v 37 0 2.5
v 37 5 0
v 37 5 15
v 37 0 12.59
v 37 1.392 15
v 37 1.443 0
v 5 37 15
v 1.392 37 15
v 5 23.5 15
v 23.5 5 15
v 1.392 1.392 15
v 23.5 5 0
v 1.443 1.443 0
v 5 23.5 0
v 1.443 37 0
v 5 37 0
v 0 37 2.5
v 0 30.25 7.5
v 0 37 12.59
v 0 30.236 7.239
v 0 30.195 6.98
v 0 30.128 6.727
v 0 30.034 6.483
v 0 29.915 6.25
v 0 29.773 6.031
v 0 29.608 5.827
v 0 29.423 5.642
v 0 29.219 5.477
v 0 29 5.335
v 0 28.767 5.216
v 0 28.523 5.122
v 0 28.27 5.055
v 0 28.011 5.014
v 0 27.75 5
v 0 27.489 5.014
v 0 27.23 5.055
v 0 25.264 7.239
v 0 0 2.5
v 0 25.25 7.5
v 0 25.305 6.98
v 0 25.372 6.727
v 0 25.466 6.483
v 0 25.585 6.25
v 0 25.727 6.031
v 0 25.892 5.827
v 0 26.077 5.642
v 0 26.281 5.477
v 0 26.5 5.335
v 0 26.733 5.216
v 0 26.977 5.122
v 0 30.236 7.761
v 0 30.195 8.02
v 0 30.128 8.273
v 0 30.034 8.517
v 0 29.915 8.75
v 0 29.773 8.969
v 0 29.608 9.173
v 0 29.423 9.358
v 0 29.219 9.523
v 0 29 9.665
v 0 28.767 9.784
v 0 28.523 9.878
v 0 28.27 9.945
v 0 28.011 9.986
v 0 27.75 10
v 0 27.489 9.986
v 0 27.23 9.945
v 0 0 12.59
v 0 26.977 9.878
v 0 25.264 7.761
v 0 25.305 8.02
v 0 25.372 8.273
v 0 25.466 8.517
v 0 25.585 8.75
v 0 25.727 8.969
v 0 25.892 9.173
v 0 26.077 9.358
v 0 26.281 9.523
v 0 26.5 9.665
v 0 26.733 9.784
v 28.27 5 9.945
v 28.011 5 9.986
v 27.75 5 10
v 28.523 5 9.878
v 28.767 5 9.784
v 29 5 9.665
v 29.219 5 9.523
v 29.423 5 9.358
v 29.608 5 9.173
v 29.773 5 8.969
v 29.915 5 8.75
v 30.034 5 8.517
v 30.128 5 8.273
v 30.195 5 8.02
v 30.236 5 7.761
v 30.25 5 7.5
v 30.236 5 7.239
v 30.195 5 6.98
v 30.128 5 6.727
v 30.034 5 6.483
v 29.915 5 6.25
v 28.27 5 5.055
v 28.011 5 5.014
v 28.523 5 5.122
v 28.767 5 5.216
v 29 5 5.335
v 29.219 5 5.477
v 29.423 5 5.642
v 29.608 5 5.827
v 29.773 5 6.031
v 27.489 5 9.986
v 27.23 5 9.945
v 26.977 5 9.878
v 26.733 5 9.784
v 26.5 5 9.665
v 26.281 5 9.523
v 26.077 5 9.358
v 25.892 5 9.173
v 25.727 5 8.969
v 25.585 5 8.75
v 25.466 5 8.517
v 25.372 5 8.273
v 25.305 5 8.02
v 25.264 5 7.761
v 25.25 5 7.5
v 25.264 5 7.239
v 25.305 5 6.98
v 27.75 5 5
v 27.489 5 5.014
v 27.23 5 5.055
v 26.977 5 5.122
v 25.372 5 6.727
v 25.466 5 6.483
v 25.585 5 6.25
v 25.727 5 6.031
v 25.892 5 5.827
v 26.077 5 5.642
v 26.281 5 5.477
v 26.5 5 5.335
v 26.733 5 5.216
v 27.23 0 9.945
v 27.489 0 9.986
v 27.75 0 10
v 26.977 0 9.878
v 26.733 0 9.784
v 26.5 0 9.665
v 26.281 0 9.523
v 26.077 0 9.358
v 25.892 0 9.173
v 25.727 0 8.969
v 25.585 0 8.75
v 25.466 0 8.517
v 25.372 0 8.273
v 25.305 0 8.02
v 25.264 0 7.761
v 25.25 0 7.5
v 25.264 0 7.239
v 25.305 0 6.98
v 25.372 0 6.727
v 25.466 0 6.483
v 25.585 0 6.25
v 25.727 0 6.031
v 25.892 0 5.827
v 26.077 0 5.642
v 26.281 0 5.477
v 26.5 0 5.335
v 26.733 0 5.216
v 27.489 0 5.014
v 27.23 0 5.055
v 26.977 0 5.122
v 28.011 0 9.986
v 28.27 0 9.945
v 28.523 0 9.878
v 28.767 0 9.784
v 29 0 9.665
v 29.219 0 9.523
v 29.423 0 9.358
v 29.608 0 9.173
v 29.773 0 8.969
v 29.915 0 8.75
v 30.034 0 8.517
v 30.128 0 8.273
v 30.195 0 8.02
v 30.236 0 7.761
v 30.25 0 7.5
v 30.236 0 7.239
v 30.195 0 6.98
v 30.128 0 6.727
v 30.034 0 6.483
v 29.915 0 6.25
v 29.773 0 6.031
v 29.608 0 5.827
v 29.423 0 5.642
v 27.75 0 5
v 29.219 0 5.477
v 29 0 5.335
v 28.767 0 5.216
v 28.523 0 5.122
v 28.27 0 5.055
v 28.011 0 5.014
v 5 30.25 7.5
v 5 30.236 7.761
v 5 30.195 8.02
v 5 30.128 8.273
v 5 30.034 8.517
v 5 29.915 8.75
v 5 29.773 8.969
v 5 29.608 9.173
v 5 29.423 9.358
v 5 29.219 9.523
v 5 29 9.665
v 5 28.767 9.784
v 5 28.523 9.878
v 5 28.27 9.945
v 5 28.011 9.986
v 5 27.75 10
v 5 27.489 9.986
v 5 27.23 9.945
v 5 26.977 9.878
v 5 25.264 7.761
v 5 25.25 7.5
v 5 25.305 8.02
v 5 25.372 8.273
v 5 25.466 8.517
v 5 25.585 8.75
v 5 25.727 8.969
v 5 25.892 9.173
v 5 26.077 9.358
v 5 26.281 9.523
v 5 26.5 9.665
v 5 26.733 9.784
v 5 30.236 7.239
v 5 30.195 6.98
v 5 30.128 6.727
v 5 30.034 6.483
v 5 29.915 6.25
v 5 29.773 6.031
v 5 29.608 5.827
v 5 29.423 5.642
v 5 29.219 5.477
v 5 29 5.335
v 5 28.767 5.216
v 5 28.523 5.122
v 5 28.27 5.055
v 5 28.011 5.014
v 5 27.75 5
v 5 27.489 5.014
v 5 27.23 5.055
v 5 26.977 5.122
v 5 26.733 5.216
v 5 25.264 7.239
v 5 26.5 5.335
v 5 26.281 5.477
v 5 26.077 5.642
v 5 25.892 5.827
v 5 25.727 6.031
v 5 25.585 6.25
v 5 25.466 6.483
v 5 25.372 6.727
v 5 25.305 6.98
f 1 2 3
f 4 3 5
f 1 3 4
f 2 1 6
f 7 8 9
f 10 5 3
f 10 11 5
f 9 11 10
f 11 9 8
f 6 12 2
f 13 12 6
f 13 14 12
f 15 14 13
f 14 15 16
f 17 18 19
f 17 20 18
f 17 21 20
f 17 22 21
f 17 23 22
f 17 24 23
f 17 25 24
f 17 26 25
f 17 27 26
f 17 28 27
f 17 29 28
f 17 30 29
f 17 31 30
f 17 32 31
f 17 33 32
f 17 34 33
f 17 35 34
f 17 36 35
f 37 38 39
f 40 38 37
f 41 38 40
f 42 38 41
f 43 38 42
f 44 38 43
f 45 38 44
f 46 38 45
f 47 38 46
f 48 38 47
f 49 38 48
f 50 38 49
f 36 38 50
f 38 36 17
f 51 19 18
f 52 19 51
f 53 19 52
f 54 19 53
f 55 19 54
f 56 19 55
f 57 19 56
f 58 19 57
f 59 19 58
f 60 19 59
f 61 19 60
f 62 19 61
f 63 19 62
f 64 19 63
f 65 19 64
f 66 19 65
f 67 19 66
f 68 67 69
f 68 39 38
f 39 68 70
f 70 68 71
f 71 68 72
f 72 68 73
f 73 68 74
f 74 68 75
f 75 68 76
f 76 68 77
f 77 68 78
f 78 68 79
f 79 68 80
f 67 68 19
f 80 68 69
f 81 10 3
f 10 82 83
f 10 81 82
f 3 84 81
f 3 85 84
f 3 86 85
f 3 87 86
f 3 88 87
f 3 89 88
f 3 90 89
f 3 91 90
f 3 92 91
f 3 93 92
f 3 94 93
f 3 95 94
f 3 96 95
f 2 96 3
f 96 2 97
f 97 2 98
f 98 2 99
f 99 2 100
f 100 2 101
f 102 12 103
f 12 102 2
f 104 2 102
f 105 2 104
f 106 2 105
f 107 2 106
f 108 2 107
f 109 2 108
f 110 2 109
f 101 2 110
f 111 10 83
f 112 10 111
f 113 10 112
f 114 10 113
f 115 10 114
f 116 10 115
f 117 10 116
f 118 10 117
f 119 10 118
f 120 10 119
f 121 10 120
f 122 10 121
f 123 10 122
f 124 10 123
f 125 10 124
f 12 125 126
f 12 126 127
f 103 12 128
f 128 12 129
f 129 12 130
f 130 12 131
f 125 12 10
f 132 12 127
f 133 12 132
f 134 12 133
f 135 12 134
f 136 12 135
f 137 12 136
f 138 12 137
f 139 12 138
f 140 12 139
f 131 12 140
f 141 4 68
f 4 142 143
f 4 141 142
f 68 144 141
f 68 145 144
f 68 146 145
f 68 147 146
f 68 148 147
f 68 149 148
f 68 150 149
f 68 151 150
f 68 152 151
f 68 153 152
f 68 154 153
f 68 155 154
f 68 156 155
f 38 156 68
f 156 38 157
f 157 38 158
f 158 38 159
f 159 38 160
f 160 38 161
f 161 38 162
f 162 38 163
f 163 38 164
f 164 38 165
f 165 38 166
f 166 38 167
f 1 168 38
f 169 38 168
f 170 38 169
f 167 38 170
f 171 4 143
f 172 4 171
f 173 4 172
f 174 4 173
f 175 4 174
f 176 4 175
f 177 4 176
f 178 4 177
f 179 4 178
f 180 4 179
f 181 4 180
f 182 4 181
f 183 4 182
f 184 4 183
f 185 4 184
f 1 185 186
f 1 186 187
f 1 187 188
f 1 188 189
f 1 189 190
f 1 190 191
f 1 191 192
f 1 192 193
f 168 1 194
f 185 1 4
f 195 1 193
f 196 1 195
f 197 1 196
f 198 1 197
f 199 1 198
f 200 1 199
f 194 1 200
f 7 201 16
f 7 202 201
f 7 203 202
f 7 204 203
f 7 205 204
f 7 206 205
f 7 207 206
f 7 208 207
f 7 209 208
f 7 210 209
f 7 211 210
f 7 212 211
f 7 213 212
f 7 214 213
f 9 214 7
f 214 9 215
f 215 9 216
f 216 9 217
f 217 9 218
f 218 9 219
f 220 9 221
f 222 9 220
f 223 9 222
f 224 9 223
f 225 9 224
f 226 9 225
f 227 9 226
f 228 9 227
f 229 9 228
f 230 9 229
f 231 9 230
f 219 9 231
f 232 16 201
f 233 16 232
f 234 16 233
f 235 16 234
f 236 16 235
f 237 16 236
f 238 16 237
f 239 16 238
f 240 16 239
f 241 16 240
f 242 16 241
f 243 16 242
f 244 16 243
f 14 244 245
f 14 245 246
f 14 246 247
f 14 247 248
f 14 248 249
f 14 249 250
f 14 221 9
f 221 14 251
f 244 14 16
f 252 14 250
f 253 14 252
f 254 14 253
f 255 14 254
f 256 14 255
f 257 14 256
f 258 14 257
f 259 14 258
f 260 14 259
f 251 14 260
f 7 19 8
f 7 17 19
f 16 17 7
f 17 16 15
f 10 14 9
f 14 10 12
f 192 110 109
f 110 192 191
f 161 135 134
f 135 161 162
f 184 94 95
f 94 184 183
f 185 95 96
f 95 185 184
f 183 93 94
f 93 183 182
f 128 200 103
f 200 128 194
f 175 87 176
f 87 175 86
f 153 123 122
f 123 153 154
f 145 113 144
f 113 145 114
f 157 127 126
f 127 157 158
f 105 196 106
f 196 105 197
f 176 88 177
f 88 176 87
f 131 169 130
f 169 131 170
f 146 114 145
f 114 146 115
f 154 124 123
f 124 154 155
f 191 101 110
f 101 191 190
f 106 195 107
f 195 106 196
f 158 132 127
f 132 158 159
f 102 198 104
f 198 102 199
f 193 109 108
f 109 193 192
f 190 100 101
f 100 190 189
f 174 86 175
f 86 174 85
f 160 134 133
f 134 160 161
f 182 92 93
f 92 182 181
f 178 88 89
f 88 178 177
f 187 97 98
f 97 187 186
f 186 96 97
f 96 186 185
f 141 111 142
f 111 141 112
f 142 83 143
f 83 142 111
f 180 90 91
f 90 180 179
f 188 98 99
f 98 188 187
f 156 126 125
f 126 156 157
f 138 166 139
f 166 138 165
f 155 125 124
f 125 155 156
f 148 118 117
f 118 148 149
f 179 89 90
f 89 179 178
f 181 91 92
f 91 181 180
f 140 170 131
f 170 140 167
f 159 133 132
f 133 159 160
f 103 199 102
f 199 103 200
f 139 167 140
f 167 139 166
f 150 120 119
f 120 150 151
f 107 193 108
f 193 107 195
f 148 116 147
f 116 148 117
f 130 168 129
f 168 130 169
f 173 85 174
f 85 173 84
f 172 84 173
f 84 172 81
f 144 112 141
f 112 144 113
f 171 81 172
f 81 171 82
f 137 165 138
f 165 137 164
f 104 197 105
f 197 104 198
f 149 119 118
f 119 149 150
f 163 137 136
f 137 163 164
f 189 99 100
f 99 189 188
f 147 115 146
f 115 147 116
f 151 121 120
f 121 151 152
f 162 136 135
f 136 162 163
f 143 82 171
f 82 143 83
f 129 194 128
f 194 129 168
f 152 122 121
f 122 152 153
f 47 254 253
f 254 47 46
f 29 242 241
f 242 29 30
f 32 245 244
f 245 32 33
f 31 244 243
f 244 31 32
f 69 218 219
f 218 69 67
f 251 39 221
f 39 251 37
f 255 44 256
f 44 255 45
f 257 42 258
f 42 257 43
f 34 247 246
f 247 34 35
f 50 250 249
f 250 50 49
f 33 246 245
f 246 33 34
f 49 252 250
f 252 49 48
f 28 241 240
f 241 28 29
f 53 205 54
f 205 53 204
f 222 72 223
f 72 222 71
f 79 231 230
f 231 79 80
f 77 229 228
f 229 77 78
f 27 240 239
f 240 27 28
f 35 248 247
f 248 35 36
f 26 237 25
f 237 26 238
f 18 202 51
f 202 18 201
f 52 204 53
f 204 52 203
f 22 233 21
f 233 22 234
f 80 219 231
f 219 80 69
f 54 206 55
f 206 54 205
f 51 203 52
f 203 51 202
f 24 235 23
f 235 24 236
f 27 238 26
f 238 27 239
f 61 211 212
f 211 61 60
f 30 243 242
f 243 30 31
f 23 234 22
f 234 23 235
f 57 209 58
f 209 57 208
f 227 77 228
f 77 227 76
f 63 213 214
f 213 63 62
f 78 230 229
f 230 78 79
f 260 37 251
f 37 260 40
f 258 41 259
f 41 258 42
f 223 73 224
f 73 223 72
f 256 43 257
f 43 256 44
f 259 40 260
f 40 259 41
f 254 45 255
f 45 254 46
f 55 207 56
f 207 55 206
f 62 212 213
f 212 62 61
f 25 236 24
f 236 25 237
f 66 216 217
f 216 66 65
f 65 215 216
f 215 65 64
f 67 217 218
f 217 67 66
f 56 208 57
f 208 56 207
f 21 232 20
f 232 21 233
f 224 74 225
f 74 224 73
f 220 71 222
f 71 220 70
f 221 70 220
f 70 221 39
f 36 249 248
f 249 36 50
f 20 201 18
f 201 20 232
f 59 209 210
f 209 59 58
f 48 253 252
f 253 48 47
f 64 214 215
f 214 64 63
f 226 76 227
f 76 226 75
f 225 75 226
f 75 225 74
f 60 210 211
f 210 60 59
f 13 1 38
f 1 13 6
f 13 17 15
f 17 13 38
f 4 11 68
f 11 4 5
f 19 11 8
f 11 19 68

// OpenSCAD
timber_construct_w = 37;
timber_construct_h = 63;
base_sheet_t = 18;
d_hole = 5;


hyp = sqrt(((timber_construct_w/2)*(timber_construct_w/2))+((timber_construct_w/2)*(timber_construct_w/2)));
$fn=60;

module prism(l, w, h)
{
    polyhedron(
        points=[[0,0,0], [l,0,0], [l,w,0], [0,w,0], [0,w,h], [l,w,h]],
        faces=[[0,1,2,3],[5,4,3,2],[0,4,5,1],[0,3,4],[5,2,1]]
        );
}


difference()
{
    union()
    {
        cube([timber_construct_w,d_hole,d_hole*3]);
        cube([d_hole,timber_construct_w,d_hole*3]);
      translate([d_hole,timber_construct_w/2+d_hole,0]) rotate([90,-90,90])  prism(d_hole*3,timber_construct_w/2,timber_construct_w/2);
    }
    translate([timber_construct_w*3/4, d_hole*2, d_hole*1.5]) rotate([90,0,0]) cylinder(h=5*d_hole, d=d_hole);
    translate([-d_hole*2, timber_construct_w*3/4, d_hole*1.5]) rotate([0,90,0]) cylinder(h=5*d_hole, d=d_hole);

  translate([-2.5, 0, -d_hole*1.5]) rotate([30,0,0]) cube([timber_construct_w+2.5+2.5,d_hole,d_hole*3]);
  translate([0, -2.5, -d_hole*1.5]) rotate([0,-30,0]) cube([d_hole,timber_construct_w+2.5+2.5,d_hole*3]);

  translate([-2.5, d_hole, d_hole*4.25]) rotate([-30,180,180]) cube([timber_construct_w+2.5+2.5,d_hole,d_hole*3]);
  translate([d_hole, -2.5, d_hole*4.25]) rotate([180,-30,180]) cube([d_hole,timber_construct_w+2.5+2.5,d_hole*3]);
    
}
